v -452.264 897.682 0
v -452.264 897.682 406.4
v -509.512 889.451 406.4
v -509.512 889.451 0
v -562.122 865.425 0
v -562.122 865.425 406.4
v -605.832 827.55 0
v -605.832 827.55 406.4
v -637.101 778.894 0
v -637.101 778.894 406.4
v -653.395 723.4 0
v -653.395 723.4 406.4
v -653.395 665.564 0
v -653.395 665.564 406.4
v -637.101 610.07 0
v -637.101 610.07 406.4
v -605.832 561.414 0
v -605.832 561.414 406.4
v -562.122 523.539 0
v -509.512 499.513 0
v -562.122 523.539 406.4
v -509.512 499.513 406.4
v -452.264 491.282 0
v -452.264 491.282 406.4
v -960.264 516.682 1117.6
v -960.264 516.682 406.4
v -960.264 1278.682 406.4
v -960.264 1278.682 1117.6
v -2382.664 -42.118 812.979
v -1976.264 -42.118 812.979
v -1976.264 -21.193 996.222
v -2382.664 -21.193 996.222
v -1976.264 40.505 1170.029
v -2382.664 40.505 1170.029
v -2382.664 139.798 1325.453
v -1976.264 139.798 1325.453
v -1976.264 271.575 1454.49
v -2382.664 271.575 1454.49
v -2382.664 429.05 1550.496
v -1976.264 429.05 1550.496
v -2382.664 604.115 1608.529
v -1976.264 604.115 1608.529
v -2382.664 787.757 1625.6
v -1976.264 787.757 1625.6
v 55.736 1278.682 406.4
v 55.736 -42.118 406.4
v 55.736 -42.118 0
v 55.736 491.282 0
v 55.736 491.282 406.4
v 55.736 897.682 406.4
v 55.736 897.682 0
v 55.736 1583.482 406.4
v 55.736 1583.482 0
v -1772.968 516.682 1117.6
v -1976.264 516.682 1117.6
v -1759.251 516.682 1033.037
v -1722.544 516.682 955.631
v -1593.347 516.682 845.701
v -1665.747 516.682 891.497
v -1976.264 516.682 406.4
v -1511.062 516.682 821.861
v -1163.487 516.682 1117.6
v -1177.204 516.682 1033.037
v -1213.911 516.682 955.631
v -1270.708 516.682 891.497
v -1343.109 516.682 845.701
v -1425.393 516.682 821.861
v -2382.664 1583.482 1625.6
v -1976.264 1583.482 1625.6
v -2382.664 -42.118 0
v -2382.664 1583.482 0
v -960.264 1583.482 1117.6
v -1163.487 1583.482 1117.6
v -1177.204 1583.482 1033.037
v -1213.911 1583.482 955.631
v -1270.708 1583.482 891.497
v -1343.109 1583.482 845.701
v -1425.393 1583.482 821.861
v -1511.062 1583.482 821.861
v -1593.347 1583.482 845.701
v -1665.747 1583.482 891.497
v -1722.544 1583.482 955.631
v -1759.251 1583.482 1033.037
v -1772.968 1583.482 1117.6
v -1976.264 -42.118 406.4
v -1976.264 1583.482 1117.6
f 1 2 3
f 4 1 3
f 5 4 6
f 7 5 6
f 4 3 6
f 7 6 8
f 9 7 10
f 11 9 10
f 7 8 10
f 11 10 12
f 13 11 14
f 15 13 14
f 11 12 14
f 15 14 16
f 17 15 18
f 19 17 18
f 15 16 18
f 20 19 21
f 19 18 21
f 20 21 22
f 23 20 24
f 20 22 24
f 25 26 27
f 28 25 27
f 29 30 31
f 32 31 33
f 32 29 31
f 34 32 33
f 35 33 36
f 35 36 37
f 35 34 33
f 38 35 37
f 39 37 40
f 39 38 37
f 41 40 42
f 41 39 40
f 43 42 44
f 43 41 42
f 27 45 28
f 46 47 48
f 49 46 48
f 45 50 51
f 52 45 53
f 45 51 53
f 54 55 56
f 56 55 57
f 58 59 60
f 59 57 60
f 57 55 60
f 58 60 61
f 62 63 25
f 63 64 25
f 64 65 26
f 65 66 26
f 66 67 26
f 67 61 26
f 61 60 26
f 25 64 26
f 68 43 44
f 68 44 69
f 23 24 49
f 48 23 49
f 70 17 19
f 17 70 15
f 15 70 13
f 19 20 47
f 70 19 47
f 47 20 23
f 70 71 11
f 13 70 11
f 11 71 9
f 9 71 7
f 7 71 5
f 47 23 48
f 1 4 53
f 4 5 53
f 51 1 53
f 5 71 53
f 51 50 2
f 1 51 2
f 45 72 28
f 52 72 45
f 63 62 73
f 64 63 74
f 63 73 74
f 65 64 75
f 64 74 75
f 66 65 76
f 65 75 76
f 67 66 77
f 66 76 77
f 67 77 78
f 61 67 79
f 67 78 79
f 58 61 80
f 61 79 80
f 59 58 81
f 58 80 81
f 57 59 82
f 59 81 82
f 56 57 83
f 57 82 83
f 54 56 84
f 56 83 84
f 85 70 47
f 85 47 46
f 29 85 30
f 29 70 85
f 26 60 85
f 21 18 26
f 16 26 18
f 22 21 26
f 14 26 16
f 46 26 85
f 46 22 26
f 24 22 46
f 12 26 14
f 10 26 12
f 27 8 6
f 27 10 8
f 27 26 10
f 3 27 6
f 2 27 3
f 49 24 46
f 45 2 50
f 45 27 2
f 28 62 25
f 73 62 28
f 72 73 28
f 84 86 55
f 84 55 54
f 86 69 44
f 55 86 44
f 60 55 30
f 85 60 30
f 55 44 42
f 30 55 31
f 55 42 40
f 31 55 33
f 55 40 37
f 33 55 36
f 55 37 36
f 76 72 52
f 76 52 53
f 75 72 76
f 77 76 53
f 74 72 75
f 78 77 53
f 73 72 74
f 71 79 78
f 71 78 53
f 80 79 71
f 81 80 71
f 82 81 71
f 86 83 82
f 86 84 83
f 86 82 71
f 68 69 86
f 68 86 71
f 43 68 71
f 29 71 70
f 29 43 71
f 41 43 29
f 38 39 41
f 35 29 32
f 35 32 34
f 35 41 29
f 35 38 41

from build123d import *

# Parameters (mm, degrees)
F0_W      = 2438.4
F0_H      = 1625.6
F1_DEPTH  = 406.4
F3_DEPTH  = 406.4
F4_W      = 1016
F4_H      = 1066.8
F5_DEPTH  = 711.2
F7_DEPTH  = 304.8
F8_R      = 304.8
F9_DEPTH  = 1625.601
F11_DEPTH = 406.401


with BuildPart() as f1:
    # F0 (on Top) → F1 (new body)
    with BuildSketch(Plane.XY):
        with Locations((-1163.46351, 770.682062)):
            Rectangle(F0_W, F0_H)
    extrude(amount=F1_DEPTH)

    # F2 (on face) → F3 (join)
    with BuildSketch(Plane(origin=(-2382.66351, 0, 0), x_dir=(0, -1, 0), z_dir=(-1, 0, 0))):
        with BuildLine():
            Line((-1583.482062, 1625.6), (-1583.482062, 406.4))
            Line((-1583.482062, 406.4), (42.117938, 406.4))
            Line((42.117938, 406.4), (42.117938, 812.979373))
            ThreePointArc((42.117938, 812.979373), (-202.01465, 1393.721325), (-787.757099, 1625.6))
            Line((-787.757099, 1625.6), (-1583.482062, 1625.6))
        make_face()
    extrude(amount=-F3_DEPTH)

    # F4 (on face) → F5 (join)
    with BuildSketch(Plane.XY.offset(406.4)):
        with Locations((-1468.26351, 1050.082062)):
            Rectangle(F4_W, F4_H)
    extrude(amount=F5_DEPTH)

    # F6 (on face) → F7 (join)
    with BuildSketch(Plane(origin=(0, 1583.482062, 0), x_dir=(-1, 0, 0), z_dir=(0, 1, 0))):
        Polygon((960.26351, 1117.6), (-55.73649, 406.4), (-55.73649, 0), (960.26351, 0), align=None)
    extrude(amount=-F7_DEPTH)

    # F8 (on face) → F9 (cut, through all)
    with BuildSketch(Plane(origin=(0, 1583.482062, 0), x_dir=(-1, 0, 0), z_dir=(0, 1, 0))):
        with Locations((1468.227641, 1123.636682)):
            Circle(F8_R)
    extrude(amount=-F9_DEPTH, mode=Mode.SUBTRACT)

    # F10 (on face) → F11 (cut, through all)
    with BuildSketch(Plane.XY.offset(406.4)):
        with BuildLine():
            Line((-452.26351, 491.282062), (55.73649, 491.282062))
            Line((55.73649, 491.282062), (55.73649, 897.682062))
            Line((55.73649, 897.682062), (-452.26351, 897.682062))
            ThreePointArc((-452.26351, 897.682062), (-655.46351, 694.482062), (-452.26351, 491.282062))
        make_face()
    extrude(amount=-F11_DEPTH, mode=Mode.SUBTRACT)


solid = f1.part
